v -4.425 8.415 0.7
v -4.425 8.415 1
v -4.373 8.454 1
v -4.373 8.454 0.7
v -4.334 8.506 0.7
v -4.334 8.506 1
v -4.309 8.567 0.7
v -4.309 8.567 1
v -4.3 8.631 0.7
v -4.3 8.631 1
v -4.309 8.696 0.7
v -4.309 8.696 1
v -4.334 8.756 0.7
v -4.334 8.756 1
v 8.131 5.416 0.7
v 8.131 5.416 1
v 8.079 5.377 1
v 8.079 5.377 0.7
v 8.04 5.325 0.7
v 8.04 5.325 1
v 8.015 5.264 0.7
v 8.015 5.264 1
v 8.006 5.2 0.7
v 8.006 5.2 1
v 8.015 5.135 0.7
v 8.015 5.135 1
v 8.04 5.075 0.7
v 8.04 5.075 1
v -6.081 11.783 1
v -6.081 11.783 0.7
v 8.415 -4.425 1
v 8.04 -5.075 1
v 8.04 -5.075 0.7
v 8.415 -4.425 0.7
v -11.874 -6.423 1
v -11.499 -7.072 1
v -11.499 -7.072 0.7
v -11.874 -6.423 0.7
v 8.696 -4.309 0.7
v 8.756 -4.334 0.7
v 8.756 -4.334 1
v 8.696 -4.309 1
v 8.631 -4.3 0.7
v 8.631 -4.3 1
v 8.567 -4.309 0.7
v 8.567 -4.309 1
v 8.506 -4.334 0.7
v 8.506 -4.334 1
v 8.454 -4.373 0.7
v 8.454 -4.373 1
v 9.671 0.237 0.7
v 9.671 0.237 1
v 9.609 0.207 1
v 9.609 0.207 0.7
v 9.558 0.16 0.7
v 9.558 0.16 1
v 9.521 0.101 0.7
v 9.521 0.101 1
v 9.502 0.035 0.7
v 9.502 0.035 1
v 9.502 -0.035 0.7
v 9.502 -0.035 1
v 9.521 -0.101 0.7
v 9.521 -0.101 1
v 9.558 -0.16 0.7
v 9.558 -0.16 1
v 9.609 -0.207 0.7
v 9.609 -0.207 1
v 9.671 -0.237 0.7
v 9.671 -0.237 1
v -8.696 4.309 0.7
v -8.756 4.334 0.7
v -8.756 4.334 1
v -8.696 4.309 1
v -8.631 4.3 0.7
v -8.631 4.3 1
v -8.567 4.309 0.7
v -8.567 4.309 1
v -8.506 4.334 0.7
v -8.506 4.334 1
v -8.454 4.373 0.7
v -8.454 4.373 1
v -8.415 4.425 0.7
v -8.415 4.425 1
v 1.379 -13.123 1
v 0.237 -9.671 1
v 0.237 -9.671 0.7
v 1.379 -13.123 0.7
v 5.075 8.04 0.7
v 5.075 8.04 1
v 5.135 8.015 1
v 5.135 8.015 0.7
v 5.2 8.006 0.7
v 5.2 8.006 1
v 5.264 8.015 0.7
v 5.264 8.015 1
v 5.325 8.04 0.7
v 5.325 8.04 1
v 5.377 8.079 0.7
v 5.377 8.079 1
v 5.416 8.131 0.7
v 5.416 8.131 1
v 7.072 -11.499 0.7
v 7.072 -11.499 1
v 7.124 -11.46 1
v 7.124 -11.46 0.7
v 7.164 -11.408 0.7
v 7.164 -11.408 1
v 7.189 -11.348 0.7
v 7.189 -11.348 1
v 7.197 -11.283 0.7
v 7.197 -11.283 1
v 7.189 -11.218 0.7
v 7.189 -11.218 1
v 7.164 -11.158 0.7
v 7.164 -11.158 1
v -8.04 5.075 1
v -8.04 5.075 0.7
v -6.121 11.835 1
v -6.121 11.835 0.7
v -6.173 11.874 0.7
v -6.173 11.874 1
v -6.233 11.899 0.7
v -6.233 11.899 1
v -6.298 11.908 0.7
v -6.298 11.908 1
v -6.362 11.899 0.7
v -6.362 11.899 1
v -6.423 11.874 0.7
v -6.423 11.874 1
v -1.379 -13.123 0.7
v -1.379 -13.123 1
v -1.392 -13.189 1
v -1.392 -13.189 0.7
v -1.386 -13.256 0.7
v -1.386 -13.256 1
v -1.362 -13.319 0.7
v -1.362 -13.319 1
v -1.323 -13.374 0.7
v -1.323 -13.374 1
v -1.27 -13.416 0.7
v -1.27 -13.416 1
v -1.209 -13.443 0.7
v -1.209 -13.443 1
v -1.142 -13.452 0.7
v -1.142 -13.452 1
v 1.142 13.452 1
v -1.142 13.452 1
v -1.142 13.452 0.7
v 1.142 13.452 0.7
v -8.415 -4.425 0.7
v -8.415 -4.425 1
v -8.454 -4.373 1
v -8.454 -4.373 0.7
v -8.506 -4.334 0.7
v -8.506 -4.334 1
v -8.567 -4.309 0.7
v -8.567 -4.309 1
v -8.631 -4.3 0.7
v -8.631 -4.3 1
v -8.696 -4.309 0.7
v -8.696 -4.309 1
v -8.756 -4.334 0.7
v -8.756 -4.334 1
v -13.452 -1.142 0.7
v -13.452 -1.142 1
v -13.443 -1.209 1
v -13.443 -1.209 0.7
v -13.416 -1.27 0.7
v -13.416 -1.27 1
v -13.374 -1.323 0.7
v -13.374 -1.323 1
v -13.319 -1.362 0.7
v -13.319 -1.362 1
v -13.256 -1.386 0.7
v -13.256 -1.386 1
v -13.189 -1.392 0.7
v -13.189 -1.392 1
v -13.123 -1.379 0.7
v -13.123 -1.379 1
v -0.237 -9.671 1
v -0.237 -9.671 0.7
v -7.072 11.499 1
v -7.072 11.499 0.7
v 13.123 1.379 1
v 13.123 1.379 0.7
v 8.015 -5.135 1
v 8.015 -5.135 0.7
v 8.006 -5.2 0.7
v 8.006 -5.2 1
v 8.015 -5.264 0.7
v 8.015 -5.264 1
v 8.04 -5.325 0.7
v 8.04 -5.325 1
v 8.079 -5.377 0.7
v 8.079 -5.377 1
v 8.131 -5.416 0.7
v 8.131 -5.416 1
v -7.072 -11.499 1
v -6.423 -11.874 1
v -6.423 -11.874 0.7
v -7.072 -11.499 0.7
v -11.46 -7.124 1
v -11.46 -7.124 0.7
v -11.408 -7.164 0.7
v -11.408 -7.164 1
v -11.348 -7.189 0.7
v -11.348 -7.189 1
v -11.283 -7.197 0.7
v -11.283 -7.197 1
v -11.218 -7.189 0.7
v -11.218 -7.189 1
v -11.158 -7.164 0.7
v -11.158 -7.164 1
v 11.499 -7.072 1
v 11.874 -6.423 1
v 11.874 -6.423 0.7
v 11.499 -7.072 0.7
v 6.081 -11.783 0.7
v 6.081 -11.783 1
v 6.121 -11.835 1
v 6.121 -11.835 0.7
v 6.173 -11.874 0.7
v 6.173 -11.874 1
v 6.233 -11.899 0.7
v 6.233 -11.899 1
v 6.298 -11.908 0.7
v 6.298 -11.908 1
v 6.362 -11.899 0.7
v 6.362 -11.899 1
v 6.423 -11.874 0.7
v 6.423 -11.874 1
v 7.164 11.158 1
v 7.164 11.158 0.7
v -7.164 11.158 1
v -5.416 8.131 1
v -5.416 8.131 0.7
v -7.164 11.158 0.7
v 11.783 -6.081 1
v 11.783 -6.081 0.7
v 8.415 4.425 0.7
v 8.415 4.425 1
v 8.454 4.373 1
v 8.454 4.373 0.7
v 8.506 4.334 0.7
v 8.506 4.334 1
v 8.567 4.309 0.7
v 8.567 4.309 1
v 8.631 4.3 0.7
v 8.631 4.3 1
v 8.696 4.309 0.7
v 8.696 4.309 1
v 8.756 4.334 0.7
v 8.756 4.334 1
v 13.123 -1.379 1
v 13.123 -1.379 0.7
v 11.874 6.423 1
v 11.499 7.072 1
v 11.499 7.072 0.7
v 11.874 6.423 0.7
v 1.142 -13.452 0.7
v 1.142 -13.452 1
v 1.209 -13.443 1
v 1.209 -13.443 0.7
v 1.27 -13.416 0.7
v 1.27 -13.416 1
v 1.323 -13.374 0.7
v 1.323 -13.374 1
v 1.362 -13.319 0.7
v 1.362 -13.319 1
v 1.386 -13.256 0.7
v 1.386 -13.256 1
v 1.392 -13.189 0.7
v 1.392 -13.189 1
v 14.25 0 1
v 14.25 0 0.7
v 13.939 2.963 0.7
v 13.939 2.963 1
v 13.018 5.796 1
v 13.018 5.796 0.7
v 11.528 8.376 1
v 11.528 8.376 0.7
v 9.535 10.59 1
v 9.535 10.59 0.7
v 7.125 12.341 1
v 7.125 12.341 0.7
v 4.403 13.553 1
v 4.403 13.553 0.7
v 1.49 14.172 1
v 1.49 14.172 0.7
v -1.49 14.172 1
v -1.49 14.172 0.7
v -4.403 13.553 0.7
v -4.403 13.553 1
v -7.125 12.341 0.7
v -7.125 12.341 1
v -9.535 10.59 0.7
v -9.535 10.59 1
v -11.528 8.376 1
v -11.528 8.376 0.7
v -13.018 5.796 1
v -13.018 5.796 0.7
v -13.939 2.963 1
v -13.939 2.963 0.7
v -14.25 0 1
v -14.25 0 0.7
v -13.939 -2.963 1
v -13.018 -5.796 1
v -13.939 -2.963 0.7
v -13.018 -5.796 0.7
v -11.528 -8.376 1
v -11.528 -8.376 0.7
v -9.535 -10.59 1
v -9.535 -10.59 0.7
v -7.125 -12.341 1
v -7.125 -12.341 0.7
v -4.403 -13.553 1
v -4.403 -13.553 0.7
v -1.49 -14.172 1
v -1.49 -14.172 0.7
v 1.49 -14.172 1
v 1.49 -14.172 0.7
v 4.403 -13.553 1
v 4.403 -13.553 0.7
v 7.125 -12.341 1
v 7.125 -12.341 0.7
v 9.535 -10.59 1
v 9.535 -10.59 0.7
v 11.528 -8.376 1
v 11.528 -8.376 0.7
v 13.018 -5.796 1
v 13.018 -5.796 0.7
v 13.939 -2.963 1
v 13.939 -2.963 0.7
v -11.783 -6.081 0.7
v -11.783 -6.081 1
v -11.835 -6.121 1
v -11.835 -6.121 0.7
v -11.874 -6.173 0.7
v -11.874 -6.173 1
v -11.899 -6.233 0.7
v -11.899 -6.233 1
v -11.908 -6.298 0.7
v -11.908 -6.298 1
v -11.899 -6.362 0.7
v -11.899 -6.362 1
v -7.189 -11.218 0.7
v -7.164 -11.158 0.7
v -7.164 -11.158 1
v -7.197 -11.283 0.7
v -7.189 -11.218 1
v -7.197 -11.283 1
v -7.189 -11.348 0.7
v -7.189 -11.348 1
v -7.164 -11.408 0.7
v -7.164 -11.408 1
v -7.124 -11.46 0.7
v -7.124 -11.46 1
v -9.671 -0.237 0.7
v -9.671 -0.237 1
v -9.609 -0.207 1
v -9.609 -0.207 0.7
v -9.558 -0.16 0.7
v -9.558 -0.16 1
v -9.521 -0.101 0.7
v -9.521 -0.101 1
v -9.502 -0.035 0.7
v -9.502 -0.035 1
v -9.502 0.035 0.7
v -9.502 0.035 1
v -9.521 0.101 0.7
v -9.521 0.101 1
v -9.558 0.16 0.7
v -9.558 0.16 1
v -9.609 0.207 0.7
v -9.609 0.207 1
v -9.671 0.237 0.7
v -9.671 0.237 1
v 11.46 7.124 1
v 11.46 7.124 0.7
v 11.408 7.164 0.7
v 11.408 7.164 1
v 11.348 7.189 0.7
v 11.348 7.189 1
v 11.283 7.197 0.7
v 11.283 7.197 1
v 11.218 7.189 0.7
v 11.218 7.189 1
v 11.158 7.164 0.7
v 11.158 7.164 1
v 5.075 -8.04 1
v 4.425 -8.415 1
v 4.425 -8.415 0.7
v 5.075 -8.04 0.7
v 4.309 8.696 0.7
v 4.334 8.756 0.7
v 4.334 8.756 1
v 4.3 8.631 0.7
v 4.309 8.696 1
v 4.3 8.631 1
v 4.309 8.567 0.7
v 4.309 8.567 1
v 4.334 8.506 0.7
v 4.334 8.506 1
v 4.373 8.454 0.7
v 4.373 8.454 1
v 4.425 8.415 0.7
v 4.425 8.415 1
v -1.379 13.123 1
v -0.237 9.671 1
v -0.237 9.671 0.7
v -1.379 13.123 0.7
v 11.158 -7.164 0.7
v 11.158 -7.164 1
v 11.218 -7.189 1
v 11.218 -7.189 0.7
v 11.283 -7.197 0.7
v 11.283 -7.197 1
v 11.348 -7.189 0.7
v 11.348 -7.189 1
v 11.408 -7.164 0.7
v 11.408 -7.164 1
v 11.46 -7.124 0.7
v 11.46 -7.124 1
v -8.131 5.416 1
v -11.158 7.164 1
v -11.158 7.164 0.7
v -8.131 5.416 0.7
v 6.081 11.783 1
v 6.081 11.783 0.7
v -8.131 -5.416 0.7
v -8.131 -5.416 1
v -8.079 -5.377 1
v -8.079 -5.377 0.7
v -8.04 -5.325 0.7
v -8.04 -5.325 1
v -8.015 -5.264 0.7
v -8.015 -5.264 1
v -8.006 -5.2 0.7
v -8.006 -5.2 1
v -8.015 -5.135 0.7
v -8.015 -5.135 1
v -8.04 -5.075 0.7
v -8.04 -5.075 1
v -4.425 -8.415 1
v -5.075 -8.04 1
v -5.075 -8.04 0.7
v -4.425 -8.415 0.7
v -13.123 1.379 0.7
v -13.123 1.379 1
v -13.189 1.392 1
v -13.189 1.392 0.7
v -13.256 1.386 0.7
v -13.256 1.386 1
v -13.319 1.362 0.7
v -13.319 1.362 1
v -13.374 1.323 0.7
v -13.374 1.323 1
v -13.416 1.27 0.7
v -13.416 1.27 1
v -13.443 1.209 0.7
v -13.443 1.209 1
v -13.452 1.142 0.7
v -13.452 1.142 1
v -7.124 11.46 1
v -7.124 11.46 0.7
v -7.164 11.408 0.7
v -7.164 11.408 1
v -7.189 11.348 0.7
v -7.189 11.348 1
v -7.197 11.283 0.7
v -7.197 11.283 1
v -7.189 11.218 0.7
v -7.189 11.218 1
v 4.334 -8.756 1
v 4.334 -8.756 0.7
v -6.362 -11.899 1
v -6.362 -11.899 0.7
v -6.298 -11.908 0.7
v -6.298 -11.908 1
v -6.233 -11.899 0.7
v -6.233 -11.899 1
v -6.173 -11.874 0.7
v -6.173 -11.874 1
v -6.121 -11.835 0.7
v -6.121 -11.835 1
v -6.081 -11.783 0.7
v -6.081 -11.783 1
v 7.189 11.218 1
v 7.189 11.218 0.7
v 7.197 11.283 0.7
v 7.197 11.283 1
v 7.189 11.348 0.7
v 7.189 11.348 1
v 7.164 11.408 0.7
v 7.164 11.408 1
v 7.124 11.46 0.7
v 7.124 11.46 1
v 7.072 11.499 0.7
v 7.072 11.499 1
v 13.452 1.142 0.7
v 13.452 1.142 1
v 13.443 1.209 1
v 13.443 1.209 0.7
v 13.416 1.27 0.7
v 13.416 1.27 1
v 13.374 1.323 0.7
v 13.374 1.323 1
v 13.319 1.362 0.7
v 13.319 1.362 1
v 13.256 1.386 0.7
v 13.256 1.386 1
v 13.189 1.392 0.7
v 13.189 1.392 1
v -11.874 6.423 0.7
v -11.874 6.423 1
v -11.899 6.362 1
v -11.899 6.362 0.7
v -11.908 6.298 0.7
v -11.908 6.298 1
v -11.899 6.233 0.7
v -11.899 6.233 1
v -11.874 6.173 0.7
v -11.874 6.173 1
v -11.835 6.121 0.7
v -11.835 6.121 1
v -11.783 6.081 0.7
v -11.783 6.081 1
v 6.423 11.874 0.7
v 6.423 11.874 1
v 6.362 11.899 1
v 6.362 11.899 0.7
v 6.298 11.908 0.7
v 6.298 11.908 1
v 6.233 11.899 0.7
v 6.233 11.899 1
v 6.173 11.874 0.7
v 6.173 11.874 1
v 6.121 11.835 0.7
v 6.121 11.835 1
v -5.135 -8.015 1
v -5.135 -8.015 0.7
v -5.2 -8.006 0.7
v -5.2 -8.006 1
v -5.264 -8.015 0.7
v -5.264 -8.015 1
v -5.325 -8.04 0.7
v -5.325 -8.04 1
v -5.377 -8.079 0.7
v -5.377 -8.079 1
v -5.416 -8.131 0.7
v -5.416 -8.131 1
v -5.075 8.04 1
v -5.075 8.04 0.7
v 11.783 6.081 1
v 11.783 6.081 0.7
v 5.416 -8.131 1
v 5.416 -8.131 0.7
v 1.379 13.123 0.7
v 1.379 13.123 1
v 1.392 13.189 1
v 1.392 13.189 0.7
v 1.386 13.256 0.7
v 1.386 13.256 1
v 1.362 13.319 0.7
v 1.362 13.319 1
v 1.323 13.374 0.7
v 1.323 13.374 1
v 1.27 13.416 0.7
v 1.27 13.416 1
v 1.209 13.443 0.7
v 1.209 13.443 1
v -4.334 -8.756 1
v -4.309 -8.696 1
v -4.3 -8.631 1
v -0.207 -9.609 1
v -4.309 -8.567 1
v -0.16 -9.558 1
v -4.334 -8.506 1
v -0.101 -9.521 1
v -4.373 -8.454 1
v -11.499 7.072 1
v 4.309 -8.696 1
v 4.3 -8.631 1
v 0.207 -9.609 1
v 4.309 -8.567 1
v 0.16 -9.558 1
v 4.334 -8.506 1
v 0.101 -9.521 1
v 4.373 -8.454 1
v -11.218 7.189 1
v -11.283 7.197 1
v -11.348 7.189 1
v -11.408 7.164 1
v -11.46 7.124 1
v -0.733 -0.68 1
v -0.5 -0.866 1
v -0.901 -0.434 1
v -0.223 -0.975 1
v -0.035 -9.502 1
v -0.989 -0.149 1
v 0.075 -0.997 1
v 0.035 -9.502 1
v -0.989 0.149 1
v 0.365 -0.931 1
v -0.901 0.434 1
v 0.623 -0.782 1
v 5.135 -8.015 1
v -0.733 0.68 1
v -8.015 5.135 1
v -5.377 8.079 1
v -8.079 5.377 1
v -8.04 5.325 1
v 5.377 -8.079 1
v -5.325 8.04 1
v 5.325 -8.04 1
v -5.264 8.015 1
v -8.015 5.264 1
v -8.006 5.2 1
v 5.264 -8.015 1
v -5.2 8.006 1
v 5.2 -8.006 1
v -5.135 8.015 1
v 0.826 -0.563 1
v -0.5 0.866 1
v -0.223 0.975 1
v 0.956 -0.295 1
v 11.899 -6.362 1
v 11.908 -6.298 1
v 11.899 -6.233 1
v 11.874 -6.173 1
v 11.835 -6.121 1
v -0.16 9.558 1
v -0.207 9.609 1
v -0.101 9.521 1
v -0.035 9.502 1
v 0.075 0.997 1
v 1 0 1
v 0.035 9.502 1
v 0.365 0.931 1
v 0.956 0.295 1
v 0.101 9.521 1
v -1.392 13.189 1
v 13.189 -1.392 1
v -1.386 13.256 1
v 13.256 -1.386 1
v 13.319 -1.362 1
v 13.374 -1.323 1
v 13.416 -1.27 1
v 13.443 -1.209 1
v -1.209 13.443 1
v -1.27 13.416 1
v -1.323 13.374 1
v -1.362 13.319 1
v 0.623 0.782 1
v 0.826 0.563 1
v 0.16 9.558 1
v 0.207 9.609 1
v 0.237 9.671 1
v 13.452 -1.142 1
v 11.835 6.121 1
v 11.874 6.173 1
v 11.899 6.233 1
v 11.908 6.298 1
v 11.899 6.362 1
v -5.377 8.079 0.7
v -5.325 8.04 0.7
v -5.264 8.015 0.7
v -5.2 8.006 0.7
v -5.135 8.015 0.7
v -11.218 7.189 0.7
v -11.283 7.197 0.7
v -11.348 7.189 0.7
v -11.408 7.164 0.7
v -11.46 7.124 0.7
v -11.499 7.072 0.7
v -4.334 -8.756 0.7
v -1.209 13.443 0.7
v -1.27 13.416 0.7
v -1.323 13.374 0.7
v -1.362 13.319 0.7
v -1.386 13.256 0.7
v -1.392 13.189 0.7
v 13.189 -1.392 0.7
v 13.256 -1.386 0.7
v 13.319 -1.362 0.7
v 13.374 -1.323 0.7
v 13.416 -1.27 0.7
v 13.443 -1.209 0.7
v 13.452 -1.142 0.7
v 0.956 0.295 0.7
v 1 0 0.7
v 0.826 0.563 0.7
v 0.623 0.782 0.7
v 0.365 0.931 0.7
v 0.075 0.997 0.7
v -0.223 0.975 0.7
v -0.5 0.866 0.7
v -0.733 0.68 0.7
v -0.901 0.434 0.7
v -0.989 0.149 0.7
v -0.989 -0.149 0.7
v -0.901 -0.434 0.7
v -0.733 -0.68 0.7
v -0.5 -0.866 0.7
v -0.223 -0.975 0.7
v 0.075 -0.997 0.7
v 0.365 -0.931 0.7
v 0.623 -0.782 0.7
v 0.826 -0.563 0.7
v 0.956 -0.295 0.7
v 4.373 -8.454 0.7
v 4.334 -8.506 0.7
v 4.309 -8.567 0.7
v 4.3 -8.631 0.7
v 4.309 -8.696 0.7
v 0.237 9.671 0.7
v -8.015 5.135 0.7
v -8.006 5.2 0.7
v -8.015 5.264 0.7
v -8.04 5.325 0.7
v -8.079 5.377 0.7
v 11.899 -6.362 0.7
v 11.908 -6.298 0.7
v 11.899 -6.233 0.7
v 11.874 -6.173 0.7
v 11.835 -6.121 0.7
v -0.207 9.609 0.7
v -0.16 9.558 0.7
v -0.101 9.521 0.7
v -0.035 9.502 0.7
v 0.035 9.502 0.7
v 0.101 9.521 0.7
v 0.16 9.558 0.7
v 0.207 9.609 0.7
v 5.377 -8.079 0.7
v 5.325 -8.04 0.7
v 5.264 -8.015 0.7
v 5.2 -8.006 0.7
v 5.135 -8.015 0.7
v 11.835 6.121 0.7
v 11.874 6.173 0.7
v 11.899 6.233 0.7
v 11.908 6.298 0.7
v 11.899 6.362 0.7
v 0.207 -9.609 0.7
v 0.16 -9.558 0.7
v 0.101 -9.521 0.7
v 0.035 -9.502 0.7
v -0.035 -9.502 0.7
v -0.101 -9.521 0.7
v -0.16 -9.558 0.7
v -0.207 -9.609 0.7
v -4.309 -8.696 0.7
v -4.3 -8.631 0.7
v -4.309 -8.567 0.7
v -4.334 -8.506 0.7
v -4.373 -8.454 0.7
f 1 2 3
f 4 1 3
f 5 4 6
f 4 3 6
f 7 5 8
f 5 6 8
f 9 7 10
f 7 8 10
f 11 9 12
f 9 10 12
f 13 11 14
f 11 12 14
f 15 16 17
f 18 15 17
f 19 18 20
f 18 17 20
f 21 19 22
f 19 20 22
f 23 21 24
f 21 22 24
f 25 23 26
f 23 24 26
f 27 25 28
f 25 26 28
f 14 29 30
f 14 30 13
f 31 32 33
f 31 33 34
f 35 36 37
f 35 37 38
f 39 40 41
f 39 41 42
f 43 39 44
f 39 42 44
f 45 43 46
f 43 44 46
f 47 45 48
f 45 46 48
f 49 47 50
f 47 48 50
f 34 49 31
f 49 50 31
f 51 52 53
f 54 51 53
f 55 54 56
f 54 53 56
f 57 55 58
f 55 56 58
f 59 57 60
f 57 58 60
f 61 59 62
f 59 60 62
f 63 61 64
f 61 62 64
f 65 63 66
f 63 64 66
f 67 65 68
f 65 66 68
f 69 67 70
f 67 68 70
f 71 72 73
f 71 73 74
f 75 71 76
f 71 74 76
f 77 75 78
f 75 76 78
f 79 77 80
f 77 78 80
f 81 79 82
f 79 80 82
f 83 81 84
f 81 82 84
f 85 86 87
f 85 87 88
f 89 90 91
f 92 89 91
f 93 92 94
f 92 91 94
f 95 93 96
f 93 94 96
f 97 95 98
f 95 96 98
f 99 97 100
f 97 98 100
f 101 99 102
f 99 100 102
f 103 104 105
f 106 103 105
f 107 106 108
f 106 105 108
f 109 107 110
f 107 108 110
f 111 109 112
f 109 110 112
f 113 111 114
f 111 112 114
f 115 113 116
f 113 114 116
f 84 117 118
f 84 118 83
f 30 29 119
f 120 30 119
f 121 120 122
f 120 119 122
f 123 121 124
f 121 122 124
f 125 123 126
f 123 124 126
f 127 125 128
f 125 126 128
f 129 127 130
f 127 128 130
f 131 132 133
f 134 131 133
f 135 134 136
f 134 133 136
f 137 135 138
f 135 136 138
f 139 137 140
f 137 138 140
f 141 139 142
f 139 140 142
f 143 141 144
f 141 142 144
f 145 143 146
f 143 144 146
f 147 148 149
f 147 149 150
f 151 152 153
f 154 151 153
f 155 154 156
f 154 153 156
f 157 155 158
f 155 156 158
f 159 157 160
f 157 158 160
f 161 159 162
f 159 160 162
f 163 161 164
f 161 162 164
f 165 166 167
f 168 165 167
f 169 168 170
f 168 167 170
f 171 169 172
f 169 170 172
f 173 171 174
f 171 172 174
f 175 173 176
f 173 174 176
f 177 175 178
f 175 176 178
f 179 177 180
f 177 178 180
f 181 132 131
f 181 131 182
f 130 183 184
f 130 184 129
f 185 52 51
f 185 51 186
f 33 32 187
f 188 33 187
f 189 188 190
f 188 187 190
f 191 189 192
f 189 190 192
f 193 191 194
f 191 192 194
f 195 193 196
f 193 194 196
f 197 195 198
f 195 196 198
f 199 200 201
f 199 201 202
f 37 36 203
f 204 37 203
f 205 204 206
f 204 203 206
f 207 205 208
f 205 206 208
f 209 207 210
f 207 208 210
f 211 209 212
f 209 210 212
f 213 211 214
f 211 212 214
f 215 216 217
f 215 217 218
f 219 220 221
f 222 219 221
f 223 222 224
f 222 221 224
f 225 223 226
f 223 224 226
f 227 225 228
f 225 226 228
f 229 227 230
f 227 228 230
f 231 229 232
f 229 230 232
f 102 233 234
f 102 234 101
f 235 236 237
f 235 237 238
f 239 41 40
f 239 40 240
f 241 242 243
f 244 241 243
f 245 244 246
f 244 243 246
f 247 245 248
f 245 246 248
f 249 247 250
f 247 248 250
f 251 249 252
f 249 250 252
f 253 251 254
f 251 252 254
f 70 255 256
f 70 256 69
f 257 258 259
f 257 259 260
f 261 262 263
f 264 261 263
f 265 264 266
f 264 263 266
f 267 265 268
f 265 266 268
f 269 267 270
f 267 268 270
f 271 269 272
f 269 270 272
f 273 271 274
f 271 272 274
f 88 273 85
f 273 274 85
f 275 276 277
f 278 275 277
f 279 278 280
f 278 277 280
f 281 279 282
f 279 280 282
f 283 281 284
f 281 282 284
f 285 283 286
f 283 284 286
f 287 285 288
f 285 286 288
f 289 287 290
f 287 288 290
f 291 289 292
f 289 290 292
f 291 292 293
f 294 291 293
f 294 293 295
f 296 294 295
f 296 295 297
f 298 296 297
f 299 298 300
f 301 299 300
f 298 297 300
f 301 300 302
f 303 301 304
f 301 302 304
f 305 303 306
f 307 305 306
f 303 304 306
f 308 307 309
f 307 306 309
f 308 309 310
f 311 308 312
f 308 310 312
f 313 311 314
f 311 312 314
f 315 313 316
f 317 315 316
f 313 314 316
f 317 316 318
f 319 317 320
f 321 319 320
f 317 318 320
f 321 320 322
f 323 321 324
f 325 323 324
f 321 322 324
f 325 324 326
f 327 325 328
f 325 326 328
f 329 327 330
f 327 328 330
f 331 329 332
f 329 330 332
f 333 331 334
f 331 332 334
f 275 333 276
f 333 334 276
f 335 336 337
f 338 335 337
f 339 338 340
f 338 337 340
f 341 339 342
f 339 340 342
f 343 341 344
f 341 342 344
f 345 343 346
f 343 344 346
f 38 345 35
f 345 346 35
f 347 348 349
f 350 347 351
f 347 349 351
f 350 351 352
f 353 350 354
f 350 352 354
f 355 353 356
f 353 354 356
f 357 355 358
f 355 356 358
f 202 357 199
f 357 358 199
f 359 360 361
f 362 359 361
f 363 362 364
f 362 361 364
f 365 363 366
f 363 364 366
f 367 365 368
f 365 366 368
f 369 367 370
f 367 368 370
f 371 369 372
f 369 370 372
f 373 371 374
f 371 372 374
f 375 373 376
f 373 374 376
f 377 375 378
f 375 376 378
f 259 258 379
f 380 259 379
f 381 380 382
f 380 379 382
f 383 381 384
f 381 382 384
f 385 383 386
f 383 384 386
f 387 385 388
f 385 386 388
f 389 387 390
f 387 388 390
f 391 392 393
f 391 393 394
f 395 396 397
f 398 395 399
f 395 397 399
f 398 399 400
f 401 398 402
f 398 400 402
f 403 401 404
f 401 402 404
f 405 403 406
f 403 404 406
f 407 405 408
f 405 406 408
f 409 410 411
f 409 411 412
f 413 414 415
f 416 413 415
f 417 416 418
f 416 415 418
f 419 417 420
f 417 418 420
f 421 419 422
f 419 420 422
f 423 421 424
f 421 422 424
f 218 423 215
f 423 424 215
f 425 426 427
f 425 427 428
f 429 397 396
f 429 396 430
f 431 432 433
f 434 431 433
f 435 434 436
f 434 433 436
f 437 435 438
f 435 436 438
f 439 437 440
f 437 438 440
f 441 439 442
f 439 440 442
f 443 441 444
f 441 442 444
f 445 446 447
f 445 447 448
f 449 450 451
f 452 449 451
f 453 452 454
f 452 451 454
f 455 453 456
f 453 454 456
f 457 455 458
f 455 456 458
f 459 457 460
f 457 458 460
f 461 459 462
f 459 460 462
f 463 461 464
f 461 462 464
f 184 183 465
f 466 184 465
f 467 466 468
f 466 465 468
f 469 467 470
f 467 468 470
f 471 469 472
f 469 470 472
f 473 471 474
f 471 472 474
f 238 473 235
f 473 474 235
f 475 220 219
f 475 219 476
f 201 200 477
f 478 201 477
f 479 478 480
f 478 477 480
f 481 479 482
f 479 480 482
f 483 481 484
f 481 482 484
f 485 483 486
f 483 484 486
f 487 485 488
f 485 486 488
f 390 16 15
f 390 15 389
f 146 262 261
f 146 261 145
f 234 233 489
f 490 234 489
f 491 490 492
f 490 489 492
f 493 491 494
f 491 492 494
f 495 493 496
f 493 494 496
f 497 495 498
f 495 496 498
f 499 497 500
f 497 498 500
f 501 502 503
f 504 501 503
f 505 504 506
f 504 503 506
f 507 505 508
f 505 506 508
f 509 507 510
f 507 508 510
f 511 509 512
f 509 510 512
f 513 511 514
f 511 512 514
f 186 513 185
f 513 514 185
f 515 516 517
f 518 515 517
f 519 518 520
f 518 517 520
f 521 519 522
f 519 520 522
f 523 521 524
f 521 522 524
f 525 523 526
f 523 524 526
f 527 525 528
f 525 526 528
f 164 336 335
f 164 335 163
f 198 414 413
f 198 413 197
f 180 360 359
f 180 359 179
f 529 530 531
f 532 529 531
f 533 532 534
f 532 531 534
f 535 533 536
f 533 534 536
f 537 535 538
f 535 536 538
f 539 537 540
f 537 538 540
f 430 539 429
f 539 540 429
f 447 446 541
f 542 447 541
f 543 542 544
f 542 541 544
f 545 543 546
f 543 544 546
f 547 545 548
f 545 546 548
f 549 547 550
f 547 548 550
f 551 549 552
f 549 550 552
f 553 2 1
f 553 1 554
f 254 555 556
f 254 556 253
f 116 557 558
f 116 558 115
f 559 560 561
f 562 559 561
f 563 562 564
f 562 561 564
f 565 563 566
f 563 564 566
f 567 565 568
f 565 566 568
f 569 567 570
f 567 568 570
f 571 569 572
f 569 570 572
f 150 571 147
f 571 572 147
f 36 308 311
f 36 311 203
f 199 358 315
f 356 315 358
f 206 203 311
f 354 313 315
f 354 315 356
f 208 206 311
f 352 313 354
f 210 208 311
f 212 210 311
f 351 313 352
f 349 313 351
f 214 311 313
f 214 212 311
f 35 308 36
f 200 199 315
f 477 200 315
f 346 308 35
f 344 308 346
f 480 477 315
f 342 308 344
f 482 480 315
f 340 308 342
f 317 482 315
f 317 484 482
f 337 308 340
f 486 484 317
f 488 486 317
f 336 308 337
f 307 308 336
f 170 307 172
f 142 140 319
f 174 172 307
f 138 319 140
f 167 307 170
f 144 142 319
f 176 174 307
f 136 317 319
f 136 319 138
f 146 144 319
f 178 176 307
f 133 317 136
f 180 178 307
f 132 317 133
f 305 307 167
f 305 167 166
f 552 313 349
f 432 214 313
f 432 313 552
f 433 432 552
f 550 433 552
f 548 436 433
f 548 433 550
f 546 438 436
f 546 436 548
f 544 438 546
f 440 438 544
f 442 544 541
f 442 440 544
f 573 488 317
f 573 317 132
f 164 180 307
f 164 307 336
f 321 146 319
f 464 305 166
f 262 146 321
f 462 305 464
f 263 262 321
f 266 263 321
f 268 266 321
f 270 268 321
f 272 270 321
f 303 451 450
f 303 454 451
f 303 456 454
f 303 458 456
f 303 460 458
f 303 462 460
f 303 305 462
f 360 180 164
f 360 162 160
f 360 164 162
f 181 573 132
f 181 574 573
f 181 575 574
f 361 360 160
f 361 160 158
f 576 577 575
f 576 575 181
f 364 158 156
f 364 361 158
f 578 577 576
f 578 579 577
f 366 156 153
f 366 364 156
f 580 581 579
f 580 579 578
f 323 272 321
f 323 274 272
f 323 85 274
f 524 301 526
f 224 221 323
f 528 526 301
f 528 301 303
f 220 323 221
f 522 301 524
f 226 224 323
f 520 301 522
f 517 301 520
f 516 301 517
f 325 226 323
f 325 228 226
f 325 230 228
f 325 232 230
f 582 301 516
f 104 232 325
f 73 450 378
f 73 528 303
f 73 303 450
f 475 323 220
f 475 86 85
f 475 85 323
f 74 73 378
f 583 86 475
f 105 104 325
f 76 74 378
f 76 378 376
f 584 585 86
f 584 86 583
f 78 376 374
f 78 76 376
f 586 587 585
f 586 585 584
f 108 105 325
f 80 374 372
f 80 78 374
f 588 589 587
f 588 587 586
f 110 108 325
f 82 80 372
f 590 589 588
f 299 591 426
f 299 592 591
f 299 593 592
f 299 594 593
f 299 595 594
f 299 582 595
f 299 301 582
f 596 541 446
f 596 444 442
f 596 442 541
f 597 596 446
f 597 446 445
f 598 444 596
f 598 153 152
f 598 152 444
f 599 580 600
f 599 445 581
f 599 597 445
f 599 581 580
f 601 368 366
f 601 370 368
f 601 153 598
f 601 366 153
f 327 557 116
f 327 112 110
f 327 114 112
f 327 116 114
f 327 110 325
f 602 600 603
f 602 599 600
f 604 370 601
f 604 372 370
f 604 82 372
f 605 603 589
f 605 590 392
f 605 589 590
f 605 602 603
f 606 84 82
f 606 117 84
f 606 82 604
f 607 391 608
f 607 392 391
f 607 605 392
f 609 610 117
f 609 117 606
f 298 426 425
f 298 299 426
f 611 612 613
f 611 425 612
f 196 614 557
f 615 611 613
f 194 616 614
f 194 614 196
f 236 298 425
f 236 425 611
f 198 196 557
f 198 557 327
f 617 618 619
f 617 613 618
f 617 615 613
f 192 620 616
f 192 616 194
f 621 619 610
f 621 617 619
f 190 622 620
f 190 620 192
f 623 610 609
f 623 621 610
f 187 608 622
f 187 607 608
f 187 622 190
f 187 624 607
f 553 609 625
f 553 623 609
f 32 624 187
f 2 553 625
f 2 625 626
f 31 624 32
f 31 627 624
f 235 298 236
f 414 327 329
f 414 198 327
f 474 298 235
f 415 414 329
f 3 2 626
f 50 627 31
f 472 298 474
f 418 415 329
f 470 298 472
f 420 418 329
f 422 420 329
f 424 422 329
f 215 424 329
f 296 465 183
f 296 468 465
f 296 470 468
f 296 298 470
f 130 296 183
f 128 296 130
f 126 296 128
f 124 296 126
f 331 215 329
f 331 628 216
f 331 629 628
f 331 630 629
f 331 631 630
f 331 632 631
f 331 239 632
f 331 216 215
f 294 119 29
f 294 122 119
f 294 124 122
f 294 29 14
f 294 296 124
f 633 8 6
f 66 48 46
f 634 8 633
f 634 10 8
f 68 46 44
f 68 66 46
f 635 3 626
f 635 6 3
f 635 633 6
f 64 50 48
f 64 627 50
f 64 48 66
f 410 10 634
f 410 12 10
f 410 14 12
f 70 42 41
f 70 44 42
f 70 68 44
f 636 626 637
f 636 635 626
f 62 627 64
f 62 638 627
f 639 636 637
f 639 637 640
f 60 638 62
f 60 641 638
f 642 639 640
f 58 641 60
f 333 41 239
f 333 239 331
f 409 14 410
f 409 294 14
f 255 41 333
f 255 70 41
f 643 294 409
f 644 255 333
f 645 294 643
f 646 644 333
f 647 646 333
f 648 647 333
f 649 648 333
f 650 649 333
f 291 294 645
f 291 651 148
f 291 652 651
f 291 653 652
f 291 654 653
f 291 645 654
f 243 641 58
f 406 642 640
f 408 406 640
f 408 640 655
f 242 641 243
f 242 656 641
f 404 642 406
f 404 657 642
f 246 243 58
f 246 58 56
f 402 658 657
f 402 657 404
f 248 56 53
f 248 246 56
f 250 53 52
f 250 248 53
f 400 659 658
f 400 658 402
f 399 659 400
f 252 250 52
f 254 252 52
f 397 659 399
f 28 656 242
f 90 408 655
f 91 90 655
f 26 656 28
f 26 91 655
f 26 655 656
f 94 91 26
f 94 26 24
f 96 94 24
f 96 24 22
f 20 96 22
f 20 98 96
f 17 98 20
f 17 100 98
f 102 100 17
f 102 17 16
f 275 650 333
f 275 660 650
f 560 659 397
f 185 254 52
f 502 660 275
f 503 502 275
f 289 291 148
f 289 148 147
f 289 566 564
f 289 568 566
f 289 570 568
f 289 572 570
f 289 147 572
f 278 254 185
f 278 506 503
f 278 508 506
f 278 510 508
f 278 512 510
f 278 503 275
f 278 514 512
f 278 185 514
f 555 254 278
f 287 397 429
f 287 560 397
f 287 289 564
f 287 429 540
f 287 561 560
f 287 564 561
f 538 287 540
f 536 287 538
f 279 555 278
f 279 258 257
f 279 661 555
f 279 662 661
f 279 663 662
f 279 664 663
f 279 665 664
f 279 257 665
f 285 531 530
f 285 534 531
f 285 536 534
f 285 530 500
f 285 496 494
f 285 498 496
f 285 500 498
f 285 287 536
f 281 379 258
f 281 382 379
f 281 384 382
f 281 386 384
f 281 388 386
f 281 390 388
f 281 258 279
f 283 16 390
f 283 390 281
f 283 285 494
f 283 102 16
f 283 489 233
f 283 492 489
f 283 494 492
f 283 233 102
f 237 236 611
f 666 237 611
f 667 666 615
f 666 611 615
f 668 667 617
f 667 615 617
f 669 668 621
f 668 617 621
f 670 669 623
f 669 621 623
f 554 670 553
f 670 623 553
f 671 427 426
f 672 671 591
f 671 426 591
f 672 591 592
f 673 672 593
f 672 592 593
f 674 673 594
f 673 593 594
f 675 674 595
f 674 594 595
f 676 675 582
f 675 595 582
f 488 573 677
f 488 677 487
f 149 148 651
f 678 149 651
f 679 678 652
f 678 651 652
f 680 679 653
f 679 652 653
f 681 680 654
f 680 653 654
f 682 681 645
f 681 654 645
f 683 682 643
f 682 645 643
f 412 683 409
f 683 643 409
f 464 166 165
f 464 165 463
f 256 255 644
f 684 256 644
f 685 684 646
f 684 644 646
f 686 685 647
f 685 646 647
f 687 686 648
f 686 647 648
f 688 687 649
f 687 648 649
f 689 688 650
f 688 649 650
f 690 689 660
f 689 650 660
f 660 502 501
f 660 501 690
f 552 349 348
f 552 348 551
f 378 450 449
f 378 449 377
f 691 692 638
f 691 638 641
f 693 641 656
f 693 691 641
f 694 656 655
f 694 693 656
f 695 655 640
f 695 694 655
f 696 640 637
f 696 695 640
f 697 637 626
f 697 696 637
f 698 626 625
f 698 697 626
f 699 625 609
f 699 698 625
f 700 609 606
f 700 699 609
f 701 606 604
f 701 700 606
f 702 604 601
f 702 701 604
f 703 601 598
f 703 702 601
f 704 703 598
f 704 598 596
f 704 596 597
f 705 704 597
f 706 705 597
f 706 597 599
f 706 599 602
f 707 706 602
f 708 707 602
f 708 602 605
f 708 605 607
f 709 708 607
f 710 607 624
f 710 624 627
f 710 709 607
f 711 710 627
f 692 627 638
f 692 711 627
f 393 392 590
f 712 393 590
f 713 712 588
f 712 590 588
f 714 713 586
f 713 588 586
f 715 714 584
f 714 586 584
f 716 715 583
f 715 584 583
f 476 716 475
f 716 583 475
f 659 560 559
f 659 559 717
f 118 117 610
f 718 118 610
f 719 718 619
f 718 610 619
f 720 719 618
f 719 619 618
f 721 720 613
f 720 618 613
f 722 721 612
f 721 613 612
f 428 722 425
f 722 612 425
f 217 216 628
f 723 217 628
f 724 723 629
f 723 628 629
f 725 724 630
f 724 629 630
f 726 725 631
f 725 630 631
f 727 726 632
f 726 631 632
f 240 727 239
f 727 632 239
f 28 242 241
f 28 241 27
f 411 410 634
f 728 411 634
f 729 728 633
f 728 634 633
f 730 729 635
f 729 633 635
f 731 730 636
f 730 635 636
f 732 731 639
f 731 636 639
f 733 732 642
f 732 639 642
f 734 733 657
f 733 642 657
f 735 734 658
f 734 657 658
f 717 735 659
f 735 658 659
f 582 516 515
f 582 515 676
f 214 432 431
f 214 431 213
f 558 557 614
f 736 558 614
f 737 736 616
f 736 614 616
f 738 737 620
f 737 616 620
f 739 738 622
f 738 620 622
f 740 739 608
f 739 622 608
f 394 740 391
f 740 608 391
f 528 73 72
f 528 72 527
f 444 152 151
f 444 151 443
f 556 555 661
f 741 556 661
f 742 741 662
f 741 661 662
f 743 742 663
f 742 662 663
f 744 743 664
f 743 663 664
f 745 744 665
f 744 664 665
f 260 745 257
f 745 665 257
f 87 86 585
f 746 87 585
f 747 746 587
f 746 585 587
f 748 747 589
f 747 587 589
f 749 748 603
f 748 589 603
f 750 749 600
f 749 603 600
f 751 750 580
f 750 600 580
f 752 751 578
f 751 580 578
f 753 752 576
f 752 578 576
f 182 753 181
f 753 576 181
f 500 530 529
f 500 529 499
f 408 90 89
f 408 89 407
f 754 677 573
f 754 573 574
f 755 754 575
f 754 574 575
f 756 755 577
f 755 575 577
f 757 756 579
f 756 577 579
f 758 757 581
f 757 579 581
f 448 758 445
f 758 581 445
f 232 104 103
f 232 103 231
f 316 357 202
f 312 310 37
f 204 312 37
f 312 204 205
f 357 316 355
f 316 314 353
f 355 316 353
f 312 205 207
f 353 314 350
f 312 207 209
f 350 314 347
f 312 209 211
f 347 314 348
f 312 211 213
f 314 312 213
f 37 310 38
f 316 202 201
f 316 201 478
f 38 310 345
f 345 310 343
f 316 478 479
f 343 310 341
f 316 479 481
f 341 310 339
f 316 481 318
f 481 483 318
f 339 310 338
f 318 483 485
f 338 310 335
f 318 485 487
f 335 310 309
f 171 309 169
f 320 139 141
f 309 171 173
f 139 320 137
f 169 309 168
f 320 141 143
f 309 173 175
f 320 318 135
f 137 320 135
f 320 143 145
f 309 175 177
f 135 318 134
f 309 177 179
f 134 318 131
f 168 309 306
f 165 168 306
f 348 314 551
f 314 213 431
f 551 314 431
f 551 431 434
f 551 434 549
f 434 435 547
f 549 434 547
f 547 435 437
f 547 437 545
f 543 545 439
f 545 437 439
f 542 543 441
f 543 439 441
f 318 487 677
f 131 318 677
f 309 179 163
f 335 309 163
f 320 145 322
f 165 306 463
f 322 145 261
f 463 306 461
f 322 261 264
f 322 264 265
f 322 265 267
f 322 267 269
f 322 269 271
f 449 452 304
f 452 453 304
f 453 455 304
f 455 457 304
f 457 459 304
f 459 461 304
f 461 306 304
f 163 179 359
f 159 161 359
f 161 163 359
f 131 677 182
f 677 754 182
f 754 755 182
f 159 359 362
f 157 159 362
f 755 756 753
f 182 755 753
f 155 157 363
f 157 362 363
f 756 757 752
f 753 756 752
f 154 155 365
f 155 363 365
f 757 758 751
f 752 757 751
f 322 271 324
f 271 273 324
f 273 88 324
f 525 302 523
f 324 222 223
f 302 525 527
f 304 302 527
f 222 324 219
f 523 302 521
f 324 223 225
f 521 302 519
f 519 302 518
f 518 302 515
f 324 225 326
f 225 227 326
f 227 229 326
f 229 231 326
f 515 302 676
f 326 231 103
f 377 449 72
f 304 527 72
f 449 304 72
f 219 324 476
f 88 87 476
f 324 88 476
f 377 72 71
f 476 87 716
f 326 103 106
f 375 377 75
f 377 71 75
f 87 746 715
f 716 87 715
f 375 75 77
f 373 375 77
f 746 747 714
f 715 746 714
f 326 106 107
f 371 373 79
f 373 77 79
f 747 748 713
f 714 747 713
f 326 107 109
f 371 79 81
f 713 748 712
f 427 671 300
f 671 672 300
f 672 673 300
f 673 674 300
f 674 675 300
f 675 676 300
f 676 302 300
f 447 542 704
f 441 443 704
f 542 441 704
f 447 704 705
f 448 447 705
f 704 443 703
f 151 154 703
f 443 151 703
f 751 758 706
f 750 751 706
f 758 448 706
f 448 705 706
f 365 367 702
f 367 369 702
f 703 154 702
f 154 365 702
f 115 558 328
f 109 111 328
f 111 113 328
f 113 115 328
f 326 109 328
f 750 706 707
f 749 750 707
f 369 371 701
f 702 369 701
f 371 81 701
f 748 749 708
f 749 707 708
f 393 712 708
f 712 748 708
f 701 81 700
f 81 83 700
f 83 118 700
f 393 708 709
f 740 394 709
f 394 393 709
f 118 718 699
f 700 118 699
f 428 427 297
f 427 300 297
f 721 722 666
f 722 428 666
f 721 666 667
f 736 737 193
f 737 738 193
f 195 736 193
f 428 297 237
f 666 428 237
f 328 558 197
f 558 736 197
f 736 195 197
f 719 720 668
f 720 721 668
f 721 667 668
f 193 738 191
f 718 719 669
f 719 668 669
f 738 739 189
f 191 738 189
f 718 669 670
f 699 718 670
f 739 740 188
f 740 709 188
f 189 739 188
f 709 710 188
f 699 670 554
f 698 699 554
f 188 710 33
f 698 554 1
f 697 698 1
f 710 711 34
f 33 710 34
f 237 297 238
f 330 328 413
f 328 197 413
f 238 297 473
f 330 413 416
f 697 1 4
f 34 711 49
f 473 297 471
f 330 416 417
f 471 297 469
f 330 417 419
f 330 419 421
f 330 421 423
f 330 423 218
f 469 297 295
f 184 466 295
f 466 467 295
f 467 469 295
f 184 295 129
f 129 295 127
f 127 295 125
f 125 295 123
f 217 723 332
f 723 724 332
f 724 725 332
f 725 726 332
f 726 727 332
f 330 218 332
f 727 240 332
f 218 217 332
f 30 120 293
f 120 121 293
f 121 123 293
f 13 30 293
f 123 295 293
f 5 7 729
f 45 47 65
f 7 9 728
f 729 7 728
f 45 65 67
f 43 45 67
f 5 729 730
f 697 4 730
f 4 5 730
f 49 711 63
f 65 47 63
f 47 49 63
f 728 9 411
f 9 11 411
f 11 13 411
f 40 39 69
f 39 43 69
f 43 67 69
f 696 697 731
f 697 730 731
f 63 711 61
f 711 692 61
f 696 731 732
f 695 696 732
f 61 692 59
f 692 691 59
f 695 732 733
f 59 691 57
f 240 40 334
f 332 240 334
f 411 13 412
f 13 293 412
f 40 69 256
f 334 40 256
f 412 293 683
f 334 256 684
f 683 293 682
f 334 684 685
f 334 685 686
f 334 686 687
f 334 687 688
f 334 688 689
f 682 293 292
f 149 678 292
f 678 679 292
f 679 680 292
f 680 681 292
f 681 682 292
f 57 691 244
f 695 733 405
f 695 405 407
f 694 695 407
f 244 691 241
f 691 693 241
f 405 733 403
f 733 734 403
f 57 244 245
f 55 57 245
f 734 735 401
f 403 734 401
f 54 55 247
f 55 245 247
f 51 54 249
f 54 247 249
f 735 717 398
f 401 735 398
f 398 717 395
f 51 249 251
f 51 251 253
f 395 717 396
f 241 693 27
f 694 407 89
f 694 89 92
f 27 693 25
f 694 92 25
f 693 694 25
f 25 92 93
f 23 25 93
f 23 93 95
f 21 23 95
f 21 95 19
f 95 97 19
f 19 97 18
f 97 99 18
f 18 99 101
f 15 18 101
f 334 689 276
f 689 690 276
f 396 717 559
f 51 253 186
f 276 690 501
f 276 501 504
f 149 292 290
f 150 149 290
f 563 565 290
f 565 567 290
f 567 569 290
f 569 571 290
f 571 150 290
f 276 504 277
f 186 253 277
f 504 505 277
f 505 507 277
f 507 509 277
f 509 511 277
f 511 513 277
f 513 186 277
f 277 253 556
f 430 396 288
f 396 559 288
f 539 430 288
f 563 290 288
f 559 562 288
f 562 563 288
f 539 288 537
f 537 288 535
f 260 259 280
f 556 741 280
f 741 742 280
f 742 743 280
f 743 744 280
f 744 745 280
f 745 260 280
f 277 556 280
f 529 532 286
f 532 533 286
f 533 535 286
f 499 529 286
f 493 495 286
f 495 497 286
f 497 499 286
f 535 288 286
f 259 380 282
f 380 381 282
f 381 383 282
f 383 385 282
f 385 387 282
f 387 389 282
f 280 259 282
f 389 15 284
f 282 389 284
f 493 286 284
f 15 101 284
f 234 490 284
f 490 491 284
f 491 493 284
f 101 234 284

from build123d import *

# Parameters (mm, degrees)
SKETCH031_R        = 14.25
SKETCH031_R_2      = 1
PAD007_DEPTH       = 0.3
POCKET_DEPTH       = 80.913406
POLARPATTERN_COUNT = 4


with BuildPart() as part:
    # Sketch031 → Pad007 (new body)
    with BuildSketch(Plane.XY.offset(0.7)):
        Circle(SKETCH031_R)
        Circle(SKETCH031_R_2, mode=Mode.SUBTRACT)
    extrude(amount=PAD007_DEPTH)

    # Sketch → Pocket (cut, through all)
    with BuildSketch(Plane.XY.offset(1)):
        with BuildLine():
            Line((-1.141945, 13.451616), (1.141945, 13.451616))
            ThreePointArc((1.379292, 13.123091), (1.344591, 13.34802), (1.141945, 13.451616))
            Line((1.379292, 13.123091), (0.237348, 9.671475))
            ThreePointArc((-0.237348, 9.671475), (0, 9.5), (0.237348, 9.671475))
            Line((-0.237348, 9.671475), (-1.379292, 13.123091))
            ThreePointArc((-1.141945, 13.451616), (-1.344591, 13.34802), (-1.379292, 13.123091))
        make_face()
        with BuildLine():
            Line((4.333734, 8.756248), (6.081129, 11.782825))
            ThreePointArc((6.422636, 11.874332), (6.232931, 11.899307), (6.081129, 11.782825))
            Line((6.422636, 11.874332), (7.072155, 11.499332))
            ThreePointArc((7.163661, 11.157825), (7.188636, 11.34753), (7.072155, 11.499332))
            Line((7.163661, 11.157825), (5.416266, 8.131248))
            ThreePointArc((5.07476, 8.039741), (5.264464, 8.014766), (5.416266, 8.131248))
            Line((5.07476, 8.039741), (4.42524, 8.414741))
            ThreePointArc((4.333734, 8.756248), (4.308759, 8.566543), (4.42524, 8.414741))
        make_face()
        with BuildLine():
            Line((8.131248, 5.416266), (11.157825, 7.163661))
            ThreePointArc((11.499332, 7.072155), (11.34753, 7.188636), (11.157825, 7.163661))
            Line((11.499332, 7.072155), (11.874332, 6.422636))
            ThreePointArc((11.782825, 6.081129), (11.899307, 6.232931), (11.874332, 6.422636))
            Line((11.782825, 6.081129), (8.756248, 4.333734))
            ThreePointArc((8.414741, 4.42524), (8.566543, 4.308759), (8.756248, 4.333734))
            Line((8.414741, 4.42524), (8.039741, 5.07476))
            ThreePointArc((8.131248, 5.416266), (8.014766, 5.264464), (8.039741, 5.07476))
        make_face()
    pocket = extrude(amount=-POCKET_DEPTH, mode=Mode.SUBTRACT)

    # PolarPattern: Pocket ×4 about axis
    polarpattern_axis = Axis((0, 0, 1), (0, 0, 1))
    for i in range(1, POLARPATTERN_COUNT):
        add(pocket.rotate(polarpattern_axis, i * 360 / POLARPATTERN_COUNT), mode=Mode.SUBTRACT)


solid = part.part
